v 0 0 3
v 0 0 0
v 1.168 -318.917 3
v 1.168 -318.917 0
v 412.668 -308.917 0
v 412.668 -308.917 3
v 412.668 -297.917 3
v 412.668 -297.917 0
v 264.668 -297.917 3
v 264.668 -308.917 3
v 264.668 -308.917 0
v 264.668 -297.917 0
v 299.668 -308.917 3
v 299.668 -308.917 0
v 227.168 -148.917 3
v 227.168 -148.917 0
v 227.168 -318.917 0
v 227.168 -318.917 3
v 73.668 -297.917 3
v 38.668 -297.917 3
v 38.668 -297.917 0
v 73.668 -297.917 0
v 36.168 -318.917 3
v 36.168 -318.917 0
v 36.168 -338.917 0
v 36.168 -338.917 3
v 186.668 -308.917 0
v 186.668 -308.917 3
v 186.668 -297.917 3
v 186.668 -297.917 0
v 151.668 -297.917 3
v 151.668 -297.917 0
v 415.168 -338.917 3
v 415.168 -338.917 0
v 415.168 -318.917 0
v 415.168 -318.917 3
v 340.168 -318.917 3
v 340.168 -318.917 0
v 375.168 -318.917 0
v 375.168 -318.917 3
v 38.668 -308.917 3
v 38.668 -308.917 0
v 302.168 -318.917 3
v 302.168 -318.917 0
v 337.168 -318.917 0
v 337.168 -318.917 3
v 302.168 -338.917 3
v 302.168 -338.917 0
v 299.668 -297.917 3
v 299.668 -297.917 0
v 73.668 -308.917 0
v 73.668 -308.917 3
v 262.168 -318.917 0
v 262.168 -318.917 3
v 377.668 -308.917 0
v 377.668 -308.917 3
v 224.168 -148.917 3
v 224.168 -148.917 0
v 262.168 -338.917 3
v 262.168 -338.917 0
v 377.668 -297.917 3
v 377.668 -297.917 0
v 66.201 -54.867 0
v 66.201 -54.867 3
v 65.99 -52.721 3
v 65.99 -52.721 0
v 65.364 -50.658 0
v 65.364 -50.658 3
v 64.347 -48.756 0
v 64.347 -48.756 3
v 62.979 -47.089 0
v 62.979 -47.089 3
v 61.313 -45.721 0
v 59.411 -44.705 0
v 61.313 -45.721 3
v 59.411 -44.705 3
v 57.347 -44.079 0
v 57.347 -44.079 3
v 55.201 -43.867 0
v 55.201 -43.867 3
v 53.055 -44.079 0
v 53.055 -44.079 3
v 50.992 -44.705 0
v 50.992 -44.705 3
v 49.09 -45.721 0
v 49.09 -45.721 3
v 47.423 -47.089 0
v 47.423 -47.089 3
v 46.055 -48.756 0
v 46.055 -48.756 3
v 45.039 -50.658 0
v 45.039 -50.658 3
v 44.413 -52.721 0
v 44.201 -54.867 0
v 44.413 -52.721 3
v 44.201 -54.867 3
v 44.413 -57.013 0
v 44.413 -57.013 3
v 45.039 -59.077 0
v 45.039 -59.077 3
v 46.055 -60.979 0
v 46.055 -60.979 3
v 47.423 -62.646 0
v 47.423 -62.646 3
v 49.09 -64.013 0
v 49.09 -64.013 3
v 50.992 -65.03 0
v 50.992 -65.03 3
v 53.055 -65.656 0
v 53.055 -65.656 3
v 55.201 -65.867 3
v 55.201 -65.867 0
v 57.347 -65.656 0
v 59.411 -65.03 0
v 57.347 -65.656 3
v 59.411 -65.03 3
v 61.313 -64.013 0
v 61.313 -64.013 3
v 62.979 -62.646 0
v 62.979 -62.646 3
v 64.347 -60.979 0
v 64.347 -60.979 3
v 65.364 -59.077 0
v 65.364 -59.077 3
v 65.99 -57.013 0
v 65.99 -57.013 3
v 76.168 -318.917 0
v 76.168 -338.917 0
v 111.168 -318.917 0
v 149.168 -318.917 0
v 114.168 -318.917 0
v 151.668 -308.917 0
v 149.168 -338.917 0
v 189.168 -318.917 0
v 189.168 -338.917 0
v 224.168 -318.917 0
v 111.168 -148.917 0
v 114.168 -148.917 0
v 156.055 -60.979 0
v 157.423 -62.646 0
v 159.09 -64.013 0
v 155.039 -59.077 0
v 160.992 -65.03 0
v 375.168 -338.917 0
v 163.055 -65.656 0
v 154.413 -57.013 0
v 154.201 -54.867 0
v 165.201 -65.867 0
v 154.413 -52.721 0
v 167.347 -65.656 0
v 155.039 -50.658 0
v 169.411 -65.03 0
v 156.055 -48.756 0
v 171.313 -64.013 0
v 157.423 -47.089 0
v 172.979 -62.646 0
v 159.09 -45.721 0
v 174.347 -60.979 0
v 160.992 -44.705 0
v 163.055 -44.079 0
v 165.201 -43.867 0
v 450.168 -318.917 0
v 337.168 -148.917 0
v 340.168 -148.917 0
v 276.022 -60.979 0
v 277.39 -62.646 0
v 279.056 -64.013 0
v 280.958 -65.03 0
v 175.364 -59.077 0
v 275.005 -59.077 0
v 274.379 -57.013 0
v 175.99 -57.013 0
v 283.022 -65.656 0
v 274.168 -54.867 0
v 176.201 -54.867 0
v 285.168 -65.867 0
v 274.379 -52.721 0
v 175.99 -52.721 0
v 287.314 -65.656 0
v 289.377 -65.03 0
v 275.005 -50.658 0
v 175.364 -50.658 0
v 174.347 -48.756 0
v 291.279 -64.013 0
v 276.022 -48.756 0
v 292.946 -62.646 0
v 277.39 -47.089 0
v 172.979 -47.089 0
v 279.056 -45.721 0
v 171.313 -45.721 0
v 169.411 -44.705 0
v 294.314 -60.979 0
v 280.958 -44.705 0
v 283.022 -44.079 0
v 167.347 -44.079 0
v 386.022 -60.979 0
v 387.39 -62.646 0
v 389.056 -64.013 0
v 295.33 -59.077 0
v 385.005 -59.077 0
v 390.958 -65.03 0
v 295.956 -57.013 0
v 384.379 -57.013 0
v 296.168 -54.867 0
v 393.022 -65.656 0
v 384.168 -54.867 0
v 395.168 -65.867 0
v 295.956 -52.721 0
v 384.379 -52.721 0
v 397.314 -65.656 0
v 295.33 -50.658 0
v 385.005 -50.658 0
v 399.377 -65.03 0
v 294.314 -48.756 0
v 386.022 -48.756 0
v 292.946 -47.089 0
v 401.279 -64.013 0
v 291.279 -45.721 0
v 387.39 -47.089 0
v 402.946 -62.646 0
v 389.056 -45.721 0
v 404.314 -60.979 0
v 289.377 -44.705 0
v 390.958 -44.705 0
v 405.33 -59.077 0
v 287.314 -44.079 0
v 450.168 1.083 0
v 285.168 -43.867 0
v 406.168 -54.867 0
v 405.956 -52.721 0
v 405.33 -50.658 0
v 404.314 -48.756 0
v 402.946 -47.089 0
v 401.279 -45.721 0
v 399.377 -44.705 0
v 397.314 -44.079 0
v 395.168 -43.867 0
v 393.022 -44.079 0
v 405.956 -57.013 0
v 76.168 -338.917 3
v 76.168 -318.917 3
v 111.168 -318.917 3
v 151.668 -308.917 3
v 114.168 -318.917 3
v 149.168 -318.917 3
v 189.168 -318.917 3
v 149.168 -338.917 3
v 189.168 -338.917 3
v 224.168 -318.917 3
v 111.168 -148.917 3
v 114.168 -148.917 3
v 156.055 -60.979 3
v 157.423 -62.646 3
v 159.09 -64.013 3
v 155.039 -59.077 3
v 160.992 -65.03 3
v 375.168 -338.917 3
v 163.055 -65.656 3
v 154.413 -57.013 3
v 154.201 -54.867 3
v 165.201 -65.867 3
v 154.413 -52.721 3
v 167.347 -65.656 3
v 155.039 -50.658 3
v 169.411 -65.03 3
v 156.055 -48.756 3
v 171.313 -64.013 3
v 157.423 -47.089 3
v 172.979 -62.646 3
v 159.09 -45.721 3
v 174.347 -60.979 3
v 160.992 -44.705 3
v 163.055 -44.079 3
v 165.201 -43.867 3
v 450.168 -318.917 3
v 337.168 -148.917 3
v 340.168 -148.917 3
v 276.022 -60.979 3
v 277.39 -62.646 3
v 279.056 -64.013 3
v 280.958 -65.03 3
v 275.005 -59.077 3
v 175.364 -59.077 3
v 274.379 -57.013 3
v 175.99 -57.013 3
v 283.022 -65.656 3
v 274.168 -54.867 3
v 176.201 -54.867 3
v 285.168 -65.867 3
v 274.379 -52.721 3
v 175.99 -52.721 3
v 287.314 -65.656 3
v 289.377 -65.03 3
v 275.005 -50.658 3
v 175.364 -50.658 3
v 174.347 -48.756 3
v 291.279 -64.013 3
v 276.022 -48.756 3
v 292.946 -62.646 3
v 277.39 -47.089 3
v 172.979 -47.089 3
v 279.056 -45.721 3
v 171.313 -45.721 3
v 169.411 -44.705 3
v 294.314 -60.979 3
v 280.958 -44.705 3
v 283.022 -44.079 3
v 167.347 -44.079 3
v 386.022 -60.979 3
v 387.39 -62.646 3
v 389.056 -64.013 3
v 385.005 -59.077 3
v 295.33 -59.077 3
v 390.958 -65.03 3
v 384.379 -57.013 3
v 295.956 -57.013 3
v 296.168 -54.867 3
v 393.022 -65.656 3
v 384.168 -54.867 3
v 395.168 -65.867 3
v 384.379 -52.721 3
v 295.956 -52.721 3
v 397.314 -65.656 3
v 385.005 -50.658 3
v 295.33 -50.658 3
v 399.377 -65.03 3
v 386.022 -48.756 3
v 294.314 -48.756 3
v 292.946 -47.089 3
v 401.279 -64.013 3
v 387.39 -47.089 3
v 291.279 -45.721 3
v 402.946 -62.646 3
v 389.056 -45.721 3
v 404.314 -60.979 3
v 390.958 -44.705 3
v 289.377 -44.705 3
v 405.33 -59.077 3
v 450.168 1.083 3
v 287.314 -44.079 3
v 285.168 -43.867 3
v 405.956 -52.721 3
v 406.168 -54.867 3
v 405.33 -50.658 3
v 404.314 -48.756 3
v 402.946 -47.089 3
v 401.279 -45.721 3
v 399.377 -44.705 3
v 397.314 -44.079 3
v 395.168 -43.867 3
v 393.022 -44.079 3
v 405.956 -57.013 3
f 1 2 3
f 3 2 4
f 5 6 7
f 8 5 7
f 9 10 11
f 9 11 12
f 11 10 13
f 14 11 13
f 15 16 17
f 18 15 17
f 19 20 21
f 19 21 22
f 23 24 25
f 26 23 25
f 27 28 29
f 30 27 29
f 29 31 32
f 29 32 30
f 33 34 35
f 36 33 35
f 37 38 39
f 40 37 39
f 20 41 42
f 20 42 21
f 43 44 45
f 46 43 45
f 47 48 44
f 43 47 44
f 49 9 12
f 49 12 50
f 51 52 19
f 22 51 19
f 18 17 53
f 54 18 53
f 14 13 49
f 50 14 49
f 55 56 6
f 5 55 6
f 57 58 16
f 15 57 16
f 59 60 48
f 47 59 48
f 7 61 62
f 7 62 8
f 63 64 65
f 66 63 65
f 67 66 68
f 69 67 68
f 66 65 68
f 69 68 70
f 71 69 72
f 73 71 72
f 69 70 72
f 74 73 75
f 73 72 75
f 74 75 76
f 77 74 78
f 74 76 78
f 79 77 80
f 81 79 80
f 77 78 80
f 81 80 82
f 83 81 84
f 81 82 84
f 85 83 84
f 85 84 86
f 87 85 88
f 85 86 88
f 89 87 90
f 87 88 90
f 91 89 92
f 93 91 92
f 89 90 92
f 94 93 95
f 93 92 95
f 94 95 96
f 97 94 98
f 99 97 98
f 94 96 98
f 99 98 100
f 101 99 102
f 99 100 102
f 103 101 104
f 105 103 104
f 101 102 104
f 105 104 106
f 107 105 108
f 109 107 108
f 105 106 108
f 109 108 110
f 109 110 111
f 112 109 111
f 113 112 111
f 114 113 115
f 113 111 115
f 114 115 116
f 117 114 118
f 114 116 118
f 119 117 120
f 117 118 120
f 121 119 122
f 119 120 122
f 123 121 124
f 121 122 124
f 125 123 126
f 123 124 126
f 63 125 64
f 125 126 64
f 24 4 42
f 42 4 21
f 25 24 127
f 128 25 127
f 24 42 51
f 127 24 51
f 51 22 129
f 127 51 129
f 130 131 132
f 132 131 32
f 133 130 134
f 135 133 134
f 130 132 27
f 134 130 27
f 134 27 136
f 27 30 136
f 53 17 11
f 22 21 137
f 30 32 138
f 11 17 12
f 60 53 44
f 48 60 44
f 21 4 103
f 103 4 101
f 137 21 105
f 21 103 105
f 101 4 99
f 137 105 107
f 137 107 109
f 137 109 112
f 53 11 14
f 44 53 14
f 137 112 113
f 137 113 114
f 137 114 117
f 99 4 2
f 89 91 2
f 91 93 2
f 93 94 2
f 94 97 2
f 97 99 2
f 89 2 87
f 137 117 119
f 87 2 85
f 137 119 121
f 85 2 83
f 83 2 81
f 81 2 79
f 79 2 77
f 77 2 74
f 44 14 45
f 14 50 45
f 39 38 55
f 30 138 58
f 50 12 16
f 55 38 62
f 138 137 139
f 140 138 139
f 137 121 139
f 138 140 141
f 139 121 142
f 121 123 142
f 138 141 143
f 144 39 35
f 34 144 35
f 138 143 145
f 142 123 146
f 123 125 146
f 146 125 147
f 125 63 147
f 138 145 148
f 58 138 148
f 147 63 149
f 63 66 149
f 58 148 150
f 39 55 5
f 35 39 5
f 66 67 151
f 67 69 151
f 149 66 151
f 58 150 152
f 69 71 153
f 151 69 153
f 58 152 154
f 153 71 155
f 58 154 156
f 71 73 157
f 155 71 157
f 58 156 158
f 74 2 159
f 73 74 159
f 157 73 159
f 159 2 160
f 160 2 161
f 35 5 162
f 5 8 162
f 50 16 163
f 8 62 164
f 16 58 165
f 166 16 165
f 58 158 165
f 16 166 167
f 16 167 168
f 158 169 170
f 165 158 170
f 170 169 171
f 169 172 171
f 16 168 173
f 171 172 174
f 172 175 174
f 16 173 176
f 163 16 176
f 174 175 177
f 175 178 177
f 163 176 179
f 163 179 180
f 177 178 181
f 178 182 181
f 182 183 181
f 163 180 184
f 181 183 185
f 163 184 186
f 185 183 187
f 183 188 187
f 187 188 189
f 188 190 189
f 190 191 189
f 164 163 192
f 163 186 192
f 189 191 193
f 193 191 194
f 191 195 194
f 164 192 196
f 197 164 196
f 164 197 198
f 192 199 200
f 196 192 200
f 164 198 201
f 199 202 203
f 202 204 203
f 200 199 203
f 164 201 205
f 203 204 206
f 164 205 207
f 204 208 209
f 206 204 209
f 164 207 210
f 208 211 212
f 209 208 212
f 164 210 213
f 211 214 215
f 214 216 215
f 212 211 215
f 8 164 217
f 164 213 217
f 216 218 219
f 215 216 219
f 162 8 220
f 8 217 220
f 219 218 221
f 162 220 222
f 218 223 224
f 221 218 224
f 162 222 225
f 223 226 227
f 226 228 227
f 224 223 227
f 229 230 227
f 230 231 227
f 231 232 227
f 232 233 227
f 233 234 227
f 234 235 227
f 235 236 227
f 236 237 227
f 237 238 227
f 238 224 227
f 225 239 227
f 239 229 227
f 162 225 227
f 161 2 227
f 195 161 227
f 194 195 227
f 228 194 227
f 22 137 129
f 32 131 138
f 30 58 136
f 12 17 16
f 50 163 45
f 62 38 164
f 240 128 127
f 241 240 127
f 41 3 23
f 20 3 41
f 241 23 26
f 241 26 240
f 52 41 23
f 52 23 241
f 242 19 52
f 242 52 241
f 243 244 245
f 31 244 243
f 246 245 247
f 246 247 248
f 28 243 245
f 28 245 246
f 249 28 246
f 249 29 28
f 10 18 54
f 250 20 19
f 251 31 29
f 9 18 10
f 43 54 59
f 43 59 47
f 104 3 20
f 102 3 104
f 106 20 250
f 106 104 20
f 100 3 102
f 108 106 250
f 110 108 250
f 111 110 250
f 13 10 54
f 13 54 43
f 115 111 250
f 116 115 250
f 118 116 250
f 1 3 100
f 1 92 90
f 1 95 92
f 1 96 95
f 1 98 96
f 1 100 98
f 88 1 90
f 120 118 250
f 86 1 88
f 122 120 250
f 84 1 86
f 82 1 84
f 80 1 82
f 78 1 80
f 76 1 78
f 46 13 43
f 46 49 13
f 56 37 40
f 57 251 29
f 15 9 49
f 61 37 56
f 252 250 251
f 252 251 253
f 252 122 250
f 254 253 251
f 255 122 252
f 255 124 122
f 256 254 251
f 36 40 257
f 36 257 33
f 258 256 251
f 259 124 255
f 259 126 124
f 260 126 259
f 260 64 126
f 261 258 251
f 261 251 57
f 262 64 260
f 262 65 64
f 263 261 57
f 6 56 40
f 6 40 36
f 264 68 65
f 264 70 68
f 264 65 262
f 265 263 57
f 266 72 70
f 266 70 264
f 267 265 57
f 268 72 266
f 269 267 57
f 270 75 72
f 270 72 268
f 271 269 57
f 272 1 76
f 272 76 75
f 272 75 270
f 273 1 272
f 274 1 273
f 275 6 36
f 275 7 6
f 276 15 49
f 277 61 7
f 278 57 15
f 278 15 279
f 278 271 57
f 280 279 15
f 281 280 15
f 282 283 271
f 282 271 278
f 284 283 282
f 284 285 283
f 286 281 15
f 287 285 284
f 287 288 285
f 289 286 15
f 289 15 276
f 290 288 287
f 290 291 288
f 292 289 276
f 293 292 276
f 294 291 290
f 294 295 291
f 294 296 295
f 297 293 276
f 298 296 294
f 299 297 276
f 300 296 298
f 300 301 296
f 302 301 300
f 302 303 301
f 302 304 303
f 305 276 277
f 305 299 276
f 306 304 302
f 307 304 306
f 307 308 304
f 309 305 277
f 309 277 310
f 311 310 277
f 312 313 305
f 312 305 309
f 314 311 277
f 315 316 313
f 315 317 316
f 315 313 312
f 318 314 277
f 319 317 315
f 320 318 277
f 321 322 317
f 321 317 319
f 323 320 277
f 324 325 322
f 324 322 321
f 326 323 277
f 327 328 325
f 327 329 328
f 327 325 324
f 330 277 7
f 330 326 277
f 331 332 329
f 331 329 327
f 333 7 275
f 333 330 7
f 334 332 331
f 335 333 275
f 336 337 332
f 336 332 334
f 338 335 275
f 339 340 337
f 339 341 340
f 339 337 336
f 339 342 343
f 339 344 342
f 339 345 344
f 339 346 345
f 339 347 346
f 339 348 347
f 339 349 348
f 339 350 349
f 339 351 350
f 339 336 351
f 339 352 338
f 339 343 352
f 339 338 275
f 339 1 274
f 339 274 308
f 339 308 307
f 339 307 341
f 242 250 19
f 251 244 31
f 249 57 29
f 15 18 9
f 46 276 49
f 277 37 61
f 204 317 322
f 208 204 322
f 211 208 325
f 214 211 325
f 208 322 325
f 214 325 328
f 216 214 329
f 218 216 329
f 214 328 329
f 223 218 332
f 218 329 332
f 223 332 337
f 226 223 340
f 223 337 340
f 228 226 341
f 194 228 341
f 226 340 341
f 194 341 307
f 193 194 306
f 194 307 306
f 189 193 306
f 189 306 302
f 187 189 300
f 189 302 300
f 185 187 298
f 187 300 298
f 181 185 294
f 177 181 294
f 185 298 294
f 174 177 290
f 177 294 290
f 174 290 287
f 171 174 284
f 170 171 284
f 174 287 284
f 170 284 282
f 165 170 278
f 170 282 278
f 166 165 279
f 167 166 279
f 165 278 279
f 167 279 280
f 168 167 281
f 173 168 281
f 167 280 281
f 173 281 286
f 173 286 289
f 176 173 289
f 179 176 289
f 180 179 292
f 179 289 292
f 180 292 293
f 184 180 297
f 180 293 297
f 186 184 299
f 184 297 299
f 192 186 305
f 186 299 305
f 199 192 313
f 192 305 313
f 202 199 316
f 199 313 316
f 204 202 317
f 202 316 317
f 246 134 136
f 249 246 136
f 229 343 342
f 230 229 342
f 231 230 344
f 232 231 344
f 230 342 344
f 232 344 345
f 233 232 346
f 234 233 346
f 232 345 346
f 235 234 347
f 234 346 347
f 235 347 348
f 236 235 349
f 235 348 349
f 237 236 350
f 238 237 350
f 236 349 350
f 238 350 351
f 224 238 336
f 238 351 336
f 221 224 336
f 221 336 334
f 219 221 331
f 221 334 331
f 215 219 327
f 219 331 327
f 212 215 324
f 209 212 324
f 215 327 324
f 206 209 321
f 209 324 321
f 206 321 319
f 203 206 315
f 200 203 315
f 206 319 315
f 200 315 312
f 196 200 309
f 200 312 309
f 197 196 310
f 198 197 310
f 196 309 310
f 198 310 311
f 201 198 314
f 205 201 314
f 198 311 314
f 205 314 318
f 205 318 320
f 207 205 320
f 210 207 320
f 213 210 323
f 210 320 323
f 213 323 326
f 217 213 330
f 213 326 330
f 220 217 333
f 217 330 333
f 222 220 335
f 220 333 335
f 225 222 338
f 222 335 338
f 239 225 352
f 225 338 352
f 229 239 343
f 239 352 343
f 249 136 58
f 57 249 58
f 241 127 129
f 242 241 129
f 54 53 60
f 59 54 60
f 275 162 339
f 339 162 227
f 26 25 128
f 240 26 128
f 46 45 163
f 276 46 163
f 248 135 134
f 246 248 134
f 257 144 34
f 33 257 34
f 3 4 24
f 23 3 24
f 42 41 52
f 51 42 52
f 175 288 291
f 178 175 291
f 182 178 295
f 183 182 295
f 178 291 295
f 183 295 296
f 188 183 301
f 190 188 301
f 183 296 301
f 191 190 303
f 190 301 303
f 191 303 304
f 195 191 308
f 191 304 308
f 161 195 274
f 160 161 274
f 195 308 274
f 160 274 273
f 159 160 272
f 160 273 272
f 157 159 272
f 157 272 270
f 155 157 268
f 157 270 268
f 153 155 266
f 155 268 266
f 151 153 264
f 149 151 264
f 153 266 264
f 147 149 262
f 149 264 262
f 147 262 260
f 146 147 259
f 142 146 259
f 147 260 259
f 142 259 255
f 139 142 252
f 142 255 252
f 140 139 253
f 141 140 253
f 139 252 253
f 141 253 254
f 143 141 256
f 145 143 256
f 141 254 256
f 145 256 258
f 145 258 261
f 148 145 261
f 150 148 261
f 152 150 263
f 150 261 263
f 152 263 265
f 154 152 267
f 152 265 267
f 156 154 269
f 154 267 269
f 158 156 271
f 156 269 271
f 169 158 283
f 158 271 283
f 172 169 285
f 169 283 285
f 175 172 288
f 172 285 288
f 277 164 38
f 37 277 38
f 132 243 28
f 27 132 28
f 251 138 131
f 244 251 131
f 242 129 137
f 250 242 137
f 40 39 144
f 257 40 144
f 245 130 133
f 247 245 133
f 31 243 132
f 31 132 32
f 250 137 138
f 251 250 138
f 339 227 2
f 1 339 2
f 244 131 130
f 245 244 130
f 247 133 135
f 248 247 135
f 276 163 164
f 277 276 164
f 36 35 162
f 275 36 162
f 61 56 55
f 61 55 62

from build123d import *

# Parameters (mm, degrees)
BOSS_EXTRUDE1_DEPTH = 3
SKETCH2_R           = 11
CUT_EXTRUDE1_DEPTH  = 3
SKETCH3_W           = 35
SKETCH3_H           = 11
CUT_EXTRUDE2_DEPTH  = 3


with BuildPart() as part:
    # Sketch1 → Boss-Extrude1 (new body)
    with BuildSketch(Plane.XY):
        Polygon((450.167740667, -318.916738079), (450.167740667, 1.083261921), (0, 0), (1.167740667, -318.916738079), (36.167740667, -318.916738079), (36.167740667, -338.916738079), (76.167740667, -338.916738079), (76.167740667, -318.916738079), (111.167740667, -318.916738079), (111.167740667, -148.916738079), (114.167740667, -148.916738079), (114.167740667, -318.916738079), (149.167740667, -318.916738079), (149.167740667, -338.916738079), (189.167740667, -338.916738079), (189.167740667, -318.916738079), (224.167740667, -318.916738079), (224.167740667, -148.916738079), (227.167740667, -148.916738079), (227.167740667, -318.916738079), (262.167740667, -318.916738079), (262.167740667, -338.916738079), (302.167740667, -338.916738079), (302.167740667, -318.916738079), (337.167740667, -318.916738079), (337.167740667, -148.916738079), (340.167740667, -148.916738079), (340.167740667, -318.916738079), (375.167740667, -318.916738079), (375.167740667, -338.916738079), (415.167740667, -338.916738079), (415.167740667, -318.916738079), align=None)
    extrude(amount=BOSS_EXTRUDE1_DEPTH)

    # Sketch2 → Cut-Extrude1 (cut)
    with BuildSketch(Plane.XY.offset(3)):
        with Locations((55.20127006, -54.867325568)):
            Circle(SKETCH2_R)
        with Locations((165.20127006, -54.867325568)):
            Circle(SKETCH2_R)
        with Locations((285.167740667, -54.867325568)):
            Circle(SKETCH2_R)
        with Locations((395.167740667, -54.867325568)):
            Circle(SKETCH2_R)
    extrude(amount=-CUT_EXTRUDE1_DEPTH, mode=Mode.SUBTRACT)

    # Sketch3 → Cut-Extrude2 (cut)
    with BuildSketch(Plane.XY.offset(3)):
        with Locations((395.167740667, -303.416738079)):
            Rectangle(SKETCH3_W, SKETCH3_H)
        with Locations((169.167740667, -303.416738079)):
            Rectangle(SKETCH3_W, SKETCH3_H)
        with Locations((282.167740667, -303.416738079)):
            Rectangle(SKETCH3_W, SKETCH3_H)
        with Locations((56.167740667, -303.416738079)):
            Rectangle(SKETCH3_W, SKETCH3_H)
    extrude(amount=-CUT_EXTRUDE2_DEPTH, mode=Mode.SUBTRACT)


solid = part.part
